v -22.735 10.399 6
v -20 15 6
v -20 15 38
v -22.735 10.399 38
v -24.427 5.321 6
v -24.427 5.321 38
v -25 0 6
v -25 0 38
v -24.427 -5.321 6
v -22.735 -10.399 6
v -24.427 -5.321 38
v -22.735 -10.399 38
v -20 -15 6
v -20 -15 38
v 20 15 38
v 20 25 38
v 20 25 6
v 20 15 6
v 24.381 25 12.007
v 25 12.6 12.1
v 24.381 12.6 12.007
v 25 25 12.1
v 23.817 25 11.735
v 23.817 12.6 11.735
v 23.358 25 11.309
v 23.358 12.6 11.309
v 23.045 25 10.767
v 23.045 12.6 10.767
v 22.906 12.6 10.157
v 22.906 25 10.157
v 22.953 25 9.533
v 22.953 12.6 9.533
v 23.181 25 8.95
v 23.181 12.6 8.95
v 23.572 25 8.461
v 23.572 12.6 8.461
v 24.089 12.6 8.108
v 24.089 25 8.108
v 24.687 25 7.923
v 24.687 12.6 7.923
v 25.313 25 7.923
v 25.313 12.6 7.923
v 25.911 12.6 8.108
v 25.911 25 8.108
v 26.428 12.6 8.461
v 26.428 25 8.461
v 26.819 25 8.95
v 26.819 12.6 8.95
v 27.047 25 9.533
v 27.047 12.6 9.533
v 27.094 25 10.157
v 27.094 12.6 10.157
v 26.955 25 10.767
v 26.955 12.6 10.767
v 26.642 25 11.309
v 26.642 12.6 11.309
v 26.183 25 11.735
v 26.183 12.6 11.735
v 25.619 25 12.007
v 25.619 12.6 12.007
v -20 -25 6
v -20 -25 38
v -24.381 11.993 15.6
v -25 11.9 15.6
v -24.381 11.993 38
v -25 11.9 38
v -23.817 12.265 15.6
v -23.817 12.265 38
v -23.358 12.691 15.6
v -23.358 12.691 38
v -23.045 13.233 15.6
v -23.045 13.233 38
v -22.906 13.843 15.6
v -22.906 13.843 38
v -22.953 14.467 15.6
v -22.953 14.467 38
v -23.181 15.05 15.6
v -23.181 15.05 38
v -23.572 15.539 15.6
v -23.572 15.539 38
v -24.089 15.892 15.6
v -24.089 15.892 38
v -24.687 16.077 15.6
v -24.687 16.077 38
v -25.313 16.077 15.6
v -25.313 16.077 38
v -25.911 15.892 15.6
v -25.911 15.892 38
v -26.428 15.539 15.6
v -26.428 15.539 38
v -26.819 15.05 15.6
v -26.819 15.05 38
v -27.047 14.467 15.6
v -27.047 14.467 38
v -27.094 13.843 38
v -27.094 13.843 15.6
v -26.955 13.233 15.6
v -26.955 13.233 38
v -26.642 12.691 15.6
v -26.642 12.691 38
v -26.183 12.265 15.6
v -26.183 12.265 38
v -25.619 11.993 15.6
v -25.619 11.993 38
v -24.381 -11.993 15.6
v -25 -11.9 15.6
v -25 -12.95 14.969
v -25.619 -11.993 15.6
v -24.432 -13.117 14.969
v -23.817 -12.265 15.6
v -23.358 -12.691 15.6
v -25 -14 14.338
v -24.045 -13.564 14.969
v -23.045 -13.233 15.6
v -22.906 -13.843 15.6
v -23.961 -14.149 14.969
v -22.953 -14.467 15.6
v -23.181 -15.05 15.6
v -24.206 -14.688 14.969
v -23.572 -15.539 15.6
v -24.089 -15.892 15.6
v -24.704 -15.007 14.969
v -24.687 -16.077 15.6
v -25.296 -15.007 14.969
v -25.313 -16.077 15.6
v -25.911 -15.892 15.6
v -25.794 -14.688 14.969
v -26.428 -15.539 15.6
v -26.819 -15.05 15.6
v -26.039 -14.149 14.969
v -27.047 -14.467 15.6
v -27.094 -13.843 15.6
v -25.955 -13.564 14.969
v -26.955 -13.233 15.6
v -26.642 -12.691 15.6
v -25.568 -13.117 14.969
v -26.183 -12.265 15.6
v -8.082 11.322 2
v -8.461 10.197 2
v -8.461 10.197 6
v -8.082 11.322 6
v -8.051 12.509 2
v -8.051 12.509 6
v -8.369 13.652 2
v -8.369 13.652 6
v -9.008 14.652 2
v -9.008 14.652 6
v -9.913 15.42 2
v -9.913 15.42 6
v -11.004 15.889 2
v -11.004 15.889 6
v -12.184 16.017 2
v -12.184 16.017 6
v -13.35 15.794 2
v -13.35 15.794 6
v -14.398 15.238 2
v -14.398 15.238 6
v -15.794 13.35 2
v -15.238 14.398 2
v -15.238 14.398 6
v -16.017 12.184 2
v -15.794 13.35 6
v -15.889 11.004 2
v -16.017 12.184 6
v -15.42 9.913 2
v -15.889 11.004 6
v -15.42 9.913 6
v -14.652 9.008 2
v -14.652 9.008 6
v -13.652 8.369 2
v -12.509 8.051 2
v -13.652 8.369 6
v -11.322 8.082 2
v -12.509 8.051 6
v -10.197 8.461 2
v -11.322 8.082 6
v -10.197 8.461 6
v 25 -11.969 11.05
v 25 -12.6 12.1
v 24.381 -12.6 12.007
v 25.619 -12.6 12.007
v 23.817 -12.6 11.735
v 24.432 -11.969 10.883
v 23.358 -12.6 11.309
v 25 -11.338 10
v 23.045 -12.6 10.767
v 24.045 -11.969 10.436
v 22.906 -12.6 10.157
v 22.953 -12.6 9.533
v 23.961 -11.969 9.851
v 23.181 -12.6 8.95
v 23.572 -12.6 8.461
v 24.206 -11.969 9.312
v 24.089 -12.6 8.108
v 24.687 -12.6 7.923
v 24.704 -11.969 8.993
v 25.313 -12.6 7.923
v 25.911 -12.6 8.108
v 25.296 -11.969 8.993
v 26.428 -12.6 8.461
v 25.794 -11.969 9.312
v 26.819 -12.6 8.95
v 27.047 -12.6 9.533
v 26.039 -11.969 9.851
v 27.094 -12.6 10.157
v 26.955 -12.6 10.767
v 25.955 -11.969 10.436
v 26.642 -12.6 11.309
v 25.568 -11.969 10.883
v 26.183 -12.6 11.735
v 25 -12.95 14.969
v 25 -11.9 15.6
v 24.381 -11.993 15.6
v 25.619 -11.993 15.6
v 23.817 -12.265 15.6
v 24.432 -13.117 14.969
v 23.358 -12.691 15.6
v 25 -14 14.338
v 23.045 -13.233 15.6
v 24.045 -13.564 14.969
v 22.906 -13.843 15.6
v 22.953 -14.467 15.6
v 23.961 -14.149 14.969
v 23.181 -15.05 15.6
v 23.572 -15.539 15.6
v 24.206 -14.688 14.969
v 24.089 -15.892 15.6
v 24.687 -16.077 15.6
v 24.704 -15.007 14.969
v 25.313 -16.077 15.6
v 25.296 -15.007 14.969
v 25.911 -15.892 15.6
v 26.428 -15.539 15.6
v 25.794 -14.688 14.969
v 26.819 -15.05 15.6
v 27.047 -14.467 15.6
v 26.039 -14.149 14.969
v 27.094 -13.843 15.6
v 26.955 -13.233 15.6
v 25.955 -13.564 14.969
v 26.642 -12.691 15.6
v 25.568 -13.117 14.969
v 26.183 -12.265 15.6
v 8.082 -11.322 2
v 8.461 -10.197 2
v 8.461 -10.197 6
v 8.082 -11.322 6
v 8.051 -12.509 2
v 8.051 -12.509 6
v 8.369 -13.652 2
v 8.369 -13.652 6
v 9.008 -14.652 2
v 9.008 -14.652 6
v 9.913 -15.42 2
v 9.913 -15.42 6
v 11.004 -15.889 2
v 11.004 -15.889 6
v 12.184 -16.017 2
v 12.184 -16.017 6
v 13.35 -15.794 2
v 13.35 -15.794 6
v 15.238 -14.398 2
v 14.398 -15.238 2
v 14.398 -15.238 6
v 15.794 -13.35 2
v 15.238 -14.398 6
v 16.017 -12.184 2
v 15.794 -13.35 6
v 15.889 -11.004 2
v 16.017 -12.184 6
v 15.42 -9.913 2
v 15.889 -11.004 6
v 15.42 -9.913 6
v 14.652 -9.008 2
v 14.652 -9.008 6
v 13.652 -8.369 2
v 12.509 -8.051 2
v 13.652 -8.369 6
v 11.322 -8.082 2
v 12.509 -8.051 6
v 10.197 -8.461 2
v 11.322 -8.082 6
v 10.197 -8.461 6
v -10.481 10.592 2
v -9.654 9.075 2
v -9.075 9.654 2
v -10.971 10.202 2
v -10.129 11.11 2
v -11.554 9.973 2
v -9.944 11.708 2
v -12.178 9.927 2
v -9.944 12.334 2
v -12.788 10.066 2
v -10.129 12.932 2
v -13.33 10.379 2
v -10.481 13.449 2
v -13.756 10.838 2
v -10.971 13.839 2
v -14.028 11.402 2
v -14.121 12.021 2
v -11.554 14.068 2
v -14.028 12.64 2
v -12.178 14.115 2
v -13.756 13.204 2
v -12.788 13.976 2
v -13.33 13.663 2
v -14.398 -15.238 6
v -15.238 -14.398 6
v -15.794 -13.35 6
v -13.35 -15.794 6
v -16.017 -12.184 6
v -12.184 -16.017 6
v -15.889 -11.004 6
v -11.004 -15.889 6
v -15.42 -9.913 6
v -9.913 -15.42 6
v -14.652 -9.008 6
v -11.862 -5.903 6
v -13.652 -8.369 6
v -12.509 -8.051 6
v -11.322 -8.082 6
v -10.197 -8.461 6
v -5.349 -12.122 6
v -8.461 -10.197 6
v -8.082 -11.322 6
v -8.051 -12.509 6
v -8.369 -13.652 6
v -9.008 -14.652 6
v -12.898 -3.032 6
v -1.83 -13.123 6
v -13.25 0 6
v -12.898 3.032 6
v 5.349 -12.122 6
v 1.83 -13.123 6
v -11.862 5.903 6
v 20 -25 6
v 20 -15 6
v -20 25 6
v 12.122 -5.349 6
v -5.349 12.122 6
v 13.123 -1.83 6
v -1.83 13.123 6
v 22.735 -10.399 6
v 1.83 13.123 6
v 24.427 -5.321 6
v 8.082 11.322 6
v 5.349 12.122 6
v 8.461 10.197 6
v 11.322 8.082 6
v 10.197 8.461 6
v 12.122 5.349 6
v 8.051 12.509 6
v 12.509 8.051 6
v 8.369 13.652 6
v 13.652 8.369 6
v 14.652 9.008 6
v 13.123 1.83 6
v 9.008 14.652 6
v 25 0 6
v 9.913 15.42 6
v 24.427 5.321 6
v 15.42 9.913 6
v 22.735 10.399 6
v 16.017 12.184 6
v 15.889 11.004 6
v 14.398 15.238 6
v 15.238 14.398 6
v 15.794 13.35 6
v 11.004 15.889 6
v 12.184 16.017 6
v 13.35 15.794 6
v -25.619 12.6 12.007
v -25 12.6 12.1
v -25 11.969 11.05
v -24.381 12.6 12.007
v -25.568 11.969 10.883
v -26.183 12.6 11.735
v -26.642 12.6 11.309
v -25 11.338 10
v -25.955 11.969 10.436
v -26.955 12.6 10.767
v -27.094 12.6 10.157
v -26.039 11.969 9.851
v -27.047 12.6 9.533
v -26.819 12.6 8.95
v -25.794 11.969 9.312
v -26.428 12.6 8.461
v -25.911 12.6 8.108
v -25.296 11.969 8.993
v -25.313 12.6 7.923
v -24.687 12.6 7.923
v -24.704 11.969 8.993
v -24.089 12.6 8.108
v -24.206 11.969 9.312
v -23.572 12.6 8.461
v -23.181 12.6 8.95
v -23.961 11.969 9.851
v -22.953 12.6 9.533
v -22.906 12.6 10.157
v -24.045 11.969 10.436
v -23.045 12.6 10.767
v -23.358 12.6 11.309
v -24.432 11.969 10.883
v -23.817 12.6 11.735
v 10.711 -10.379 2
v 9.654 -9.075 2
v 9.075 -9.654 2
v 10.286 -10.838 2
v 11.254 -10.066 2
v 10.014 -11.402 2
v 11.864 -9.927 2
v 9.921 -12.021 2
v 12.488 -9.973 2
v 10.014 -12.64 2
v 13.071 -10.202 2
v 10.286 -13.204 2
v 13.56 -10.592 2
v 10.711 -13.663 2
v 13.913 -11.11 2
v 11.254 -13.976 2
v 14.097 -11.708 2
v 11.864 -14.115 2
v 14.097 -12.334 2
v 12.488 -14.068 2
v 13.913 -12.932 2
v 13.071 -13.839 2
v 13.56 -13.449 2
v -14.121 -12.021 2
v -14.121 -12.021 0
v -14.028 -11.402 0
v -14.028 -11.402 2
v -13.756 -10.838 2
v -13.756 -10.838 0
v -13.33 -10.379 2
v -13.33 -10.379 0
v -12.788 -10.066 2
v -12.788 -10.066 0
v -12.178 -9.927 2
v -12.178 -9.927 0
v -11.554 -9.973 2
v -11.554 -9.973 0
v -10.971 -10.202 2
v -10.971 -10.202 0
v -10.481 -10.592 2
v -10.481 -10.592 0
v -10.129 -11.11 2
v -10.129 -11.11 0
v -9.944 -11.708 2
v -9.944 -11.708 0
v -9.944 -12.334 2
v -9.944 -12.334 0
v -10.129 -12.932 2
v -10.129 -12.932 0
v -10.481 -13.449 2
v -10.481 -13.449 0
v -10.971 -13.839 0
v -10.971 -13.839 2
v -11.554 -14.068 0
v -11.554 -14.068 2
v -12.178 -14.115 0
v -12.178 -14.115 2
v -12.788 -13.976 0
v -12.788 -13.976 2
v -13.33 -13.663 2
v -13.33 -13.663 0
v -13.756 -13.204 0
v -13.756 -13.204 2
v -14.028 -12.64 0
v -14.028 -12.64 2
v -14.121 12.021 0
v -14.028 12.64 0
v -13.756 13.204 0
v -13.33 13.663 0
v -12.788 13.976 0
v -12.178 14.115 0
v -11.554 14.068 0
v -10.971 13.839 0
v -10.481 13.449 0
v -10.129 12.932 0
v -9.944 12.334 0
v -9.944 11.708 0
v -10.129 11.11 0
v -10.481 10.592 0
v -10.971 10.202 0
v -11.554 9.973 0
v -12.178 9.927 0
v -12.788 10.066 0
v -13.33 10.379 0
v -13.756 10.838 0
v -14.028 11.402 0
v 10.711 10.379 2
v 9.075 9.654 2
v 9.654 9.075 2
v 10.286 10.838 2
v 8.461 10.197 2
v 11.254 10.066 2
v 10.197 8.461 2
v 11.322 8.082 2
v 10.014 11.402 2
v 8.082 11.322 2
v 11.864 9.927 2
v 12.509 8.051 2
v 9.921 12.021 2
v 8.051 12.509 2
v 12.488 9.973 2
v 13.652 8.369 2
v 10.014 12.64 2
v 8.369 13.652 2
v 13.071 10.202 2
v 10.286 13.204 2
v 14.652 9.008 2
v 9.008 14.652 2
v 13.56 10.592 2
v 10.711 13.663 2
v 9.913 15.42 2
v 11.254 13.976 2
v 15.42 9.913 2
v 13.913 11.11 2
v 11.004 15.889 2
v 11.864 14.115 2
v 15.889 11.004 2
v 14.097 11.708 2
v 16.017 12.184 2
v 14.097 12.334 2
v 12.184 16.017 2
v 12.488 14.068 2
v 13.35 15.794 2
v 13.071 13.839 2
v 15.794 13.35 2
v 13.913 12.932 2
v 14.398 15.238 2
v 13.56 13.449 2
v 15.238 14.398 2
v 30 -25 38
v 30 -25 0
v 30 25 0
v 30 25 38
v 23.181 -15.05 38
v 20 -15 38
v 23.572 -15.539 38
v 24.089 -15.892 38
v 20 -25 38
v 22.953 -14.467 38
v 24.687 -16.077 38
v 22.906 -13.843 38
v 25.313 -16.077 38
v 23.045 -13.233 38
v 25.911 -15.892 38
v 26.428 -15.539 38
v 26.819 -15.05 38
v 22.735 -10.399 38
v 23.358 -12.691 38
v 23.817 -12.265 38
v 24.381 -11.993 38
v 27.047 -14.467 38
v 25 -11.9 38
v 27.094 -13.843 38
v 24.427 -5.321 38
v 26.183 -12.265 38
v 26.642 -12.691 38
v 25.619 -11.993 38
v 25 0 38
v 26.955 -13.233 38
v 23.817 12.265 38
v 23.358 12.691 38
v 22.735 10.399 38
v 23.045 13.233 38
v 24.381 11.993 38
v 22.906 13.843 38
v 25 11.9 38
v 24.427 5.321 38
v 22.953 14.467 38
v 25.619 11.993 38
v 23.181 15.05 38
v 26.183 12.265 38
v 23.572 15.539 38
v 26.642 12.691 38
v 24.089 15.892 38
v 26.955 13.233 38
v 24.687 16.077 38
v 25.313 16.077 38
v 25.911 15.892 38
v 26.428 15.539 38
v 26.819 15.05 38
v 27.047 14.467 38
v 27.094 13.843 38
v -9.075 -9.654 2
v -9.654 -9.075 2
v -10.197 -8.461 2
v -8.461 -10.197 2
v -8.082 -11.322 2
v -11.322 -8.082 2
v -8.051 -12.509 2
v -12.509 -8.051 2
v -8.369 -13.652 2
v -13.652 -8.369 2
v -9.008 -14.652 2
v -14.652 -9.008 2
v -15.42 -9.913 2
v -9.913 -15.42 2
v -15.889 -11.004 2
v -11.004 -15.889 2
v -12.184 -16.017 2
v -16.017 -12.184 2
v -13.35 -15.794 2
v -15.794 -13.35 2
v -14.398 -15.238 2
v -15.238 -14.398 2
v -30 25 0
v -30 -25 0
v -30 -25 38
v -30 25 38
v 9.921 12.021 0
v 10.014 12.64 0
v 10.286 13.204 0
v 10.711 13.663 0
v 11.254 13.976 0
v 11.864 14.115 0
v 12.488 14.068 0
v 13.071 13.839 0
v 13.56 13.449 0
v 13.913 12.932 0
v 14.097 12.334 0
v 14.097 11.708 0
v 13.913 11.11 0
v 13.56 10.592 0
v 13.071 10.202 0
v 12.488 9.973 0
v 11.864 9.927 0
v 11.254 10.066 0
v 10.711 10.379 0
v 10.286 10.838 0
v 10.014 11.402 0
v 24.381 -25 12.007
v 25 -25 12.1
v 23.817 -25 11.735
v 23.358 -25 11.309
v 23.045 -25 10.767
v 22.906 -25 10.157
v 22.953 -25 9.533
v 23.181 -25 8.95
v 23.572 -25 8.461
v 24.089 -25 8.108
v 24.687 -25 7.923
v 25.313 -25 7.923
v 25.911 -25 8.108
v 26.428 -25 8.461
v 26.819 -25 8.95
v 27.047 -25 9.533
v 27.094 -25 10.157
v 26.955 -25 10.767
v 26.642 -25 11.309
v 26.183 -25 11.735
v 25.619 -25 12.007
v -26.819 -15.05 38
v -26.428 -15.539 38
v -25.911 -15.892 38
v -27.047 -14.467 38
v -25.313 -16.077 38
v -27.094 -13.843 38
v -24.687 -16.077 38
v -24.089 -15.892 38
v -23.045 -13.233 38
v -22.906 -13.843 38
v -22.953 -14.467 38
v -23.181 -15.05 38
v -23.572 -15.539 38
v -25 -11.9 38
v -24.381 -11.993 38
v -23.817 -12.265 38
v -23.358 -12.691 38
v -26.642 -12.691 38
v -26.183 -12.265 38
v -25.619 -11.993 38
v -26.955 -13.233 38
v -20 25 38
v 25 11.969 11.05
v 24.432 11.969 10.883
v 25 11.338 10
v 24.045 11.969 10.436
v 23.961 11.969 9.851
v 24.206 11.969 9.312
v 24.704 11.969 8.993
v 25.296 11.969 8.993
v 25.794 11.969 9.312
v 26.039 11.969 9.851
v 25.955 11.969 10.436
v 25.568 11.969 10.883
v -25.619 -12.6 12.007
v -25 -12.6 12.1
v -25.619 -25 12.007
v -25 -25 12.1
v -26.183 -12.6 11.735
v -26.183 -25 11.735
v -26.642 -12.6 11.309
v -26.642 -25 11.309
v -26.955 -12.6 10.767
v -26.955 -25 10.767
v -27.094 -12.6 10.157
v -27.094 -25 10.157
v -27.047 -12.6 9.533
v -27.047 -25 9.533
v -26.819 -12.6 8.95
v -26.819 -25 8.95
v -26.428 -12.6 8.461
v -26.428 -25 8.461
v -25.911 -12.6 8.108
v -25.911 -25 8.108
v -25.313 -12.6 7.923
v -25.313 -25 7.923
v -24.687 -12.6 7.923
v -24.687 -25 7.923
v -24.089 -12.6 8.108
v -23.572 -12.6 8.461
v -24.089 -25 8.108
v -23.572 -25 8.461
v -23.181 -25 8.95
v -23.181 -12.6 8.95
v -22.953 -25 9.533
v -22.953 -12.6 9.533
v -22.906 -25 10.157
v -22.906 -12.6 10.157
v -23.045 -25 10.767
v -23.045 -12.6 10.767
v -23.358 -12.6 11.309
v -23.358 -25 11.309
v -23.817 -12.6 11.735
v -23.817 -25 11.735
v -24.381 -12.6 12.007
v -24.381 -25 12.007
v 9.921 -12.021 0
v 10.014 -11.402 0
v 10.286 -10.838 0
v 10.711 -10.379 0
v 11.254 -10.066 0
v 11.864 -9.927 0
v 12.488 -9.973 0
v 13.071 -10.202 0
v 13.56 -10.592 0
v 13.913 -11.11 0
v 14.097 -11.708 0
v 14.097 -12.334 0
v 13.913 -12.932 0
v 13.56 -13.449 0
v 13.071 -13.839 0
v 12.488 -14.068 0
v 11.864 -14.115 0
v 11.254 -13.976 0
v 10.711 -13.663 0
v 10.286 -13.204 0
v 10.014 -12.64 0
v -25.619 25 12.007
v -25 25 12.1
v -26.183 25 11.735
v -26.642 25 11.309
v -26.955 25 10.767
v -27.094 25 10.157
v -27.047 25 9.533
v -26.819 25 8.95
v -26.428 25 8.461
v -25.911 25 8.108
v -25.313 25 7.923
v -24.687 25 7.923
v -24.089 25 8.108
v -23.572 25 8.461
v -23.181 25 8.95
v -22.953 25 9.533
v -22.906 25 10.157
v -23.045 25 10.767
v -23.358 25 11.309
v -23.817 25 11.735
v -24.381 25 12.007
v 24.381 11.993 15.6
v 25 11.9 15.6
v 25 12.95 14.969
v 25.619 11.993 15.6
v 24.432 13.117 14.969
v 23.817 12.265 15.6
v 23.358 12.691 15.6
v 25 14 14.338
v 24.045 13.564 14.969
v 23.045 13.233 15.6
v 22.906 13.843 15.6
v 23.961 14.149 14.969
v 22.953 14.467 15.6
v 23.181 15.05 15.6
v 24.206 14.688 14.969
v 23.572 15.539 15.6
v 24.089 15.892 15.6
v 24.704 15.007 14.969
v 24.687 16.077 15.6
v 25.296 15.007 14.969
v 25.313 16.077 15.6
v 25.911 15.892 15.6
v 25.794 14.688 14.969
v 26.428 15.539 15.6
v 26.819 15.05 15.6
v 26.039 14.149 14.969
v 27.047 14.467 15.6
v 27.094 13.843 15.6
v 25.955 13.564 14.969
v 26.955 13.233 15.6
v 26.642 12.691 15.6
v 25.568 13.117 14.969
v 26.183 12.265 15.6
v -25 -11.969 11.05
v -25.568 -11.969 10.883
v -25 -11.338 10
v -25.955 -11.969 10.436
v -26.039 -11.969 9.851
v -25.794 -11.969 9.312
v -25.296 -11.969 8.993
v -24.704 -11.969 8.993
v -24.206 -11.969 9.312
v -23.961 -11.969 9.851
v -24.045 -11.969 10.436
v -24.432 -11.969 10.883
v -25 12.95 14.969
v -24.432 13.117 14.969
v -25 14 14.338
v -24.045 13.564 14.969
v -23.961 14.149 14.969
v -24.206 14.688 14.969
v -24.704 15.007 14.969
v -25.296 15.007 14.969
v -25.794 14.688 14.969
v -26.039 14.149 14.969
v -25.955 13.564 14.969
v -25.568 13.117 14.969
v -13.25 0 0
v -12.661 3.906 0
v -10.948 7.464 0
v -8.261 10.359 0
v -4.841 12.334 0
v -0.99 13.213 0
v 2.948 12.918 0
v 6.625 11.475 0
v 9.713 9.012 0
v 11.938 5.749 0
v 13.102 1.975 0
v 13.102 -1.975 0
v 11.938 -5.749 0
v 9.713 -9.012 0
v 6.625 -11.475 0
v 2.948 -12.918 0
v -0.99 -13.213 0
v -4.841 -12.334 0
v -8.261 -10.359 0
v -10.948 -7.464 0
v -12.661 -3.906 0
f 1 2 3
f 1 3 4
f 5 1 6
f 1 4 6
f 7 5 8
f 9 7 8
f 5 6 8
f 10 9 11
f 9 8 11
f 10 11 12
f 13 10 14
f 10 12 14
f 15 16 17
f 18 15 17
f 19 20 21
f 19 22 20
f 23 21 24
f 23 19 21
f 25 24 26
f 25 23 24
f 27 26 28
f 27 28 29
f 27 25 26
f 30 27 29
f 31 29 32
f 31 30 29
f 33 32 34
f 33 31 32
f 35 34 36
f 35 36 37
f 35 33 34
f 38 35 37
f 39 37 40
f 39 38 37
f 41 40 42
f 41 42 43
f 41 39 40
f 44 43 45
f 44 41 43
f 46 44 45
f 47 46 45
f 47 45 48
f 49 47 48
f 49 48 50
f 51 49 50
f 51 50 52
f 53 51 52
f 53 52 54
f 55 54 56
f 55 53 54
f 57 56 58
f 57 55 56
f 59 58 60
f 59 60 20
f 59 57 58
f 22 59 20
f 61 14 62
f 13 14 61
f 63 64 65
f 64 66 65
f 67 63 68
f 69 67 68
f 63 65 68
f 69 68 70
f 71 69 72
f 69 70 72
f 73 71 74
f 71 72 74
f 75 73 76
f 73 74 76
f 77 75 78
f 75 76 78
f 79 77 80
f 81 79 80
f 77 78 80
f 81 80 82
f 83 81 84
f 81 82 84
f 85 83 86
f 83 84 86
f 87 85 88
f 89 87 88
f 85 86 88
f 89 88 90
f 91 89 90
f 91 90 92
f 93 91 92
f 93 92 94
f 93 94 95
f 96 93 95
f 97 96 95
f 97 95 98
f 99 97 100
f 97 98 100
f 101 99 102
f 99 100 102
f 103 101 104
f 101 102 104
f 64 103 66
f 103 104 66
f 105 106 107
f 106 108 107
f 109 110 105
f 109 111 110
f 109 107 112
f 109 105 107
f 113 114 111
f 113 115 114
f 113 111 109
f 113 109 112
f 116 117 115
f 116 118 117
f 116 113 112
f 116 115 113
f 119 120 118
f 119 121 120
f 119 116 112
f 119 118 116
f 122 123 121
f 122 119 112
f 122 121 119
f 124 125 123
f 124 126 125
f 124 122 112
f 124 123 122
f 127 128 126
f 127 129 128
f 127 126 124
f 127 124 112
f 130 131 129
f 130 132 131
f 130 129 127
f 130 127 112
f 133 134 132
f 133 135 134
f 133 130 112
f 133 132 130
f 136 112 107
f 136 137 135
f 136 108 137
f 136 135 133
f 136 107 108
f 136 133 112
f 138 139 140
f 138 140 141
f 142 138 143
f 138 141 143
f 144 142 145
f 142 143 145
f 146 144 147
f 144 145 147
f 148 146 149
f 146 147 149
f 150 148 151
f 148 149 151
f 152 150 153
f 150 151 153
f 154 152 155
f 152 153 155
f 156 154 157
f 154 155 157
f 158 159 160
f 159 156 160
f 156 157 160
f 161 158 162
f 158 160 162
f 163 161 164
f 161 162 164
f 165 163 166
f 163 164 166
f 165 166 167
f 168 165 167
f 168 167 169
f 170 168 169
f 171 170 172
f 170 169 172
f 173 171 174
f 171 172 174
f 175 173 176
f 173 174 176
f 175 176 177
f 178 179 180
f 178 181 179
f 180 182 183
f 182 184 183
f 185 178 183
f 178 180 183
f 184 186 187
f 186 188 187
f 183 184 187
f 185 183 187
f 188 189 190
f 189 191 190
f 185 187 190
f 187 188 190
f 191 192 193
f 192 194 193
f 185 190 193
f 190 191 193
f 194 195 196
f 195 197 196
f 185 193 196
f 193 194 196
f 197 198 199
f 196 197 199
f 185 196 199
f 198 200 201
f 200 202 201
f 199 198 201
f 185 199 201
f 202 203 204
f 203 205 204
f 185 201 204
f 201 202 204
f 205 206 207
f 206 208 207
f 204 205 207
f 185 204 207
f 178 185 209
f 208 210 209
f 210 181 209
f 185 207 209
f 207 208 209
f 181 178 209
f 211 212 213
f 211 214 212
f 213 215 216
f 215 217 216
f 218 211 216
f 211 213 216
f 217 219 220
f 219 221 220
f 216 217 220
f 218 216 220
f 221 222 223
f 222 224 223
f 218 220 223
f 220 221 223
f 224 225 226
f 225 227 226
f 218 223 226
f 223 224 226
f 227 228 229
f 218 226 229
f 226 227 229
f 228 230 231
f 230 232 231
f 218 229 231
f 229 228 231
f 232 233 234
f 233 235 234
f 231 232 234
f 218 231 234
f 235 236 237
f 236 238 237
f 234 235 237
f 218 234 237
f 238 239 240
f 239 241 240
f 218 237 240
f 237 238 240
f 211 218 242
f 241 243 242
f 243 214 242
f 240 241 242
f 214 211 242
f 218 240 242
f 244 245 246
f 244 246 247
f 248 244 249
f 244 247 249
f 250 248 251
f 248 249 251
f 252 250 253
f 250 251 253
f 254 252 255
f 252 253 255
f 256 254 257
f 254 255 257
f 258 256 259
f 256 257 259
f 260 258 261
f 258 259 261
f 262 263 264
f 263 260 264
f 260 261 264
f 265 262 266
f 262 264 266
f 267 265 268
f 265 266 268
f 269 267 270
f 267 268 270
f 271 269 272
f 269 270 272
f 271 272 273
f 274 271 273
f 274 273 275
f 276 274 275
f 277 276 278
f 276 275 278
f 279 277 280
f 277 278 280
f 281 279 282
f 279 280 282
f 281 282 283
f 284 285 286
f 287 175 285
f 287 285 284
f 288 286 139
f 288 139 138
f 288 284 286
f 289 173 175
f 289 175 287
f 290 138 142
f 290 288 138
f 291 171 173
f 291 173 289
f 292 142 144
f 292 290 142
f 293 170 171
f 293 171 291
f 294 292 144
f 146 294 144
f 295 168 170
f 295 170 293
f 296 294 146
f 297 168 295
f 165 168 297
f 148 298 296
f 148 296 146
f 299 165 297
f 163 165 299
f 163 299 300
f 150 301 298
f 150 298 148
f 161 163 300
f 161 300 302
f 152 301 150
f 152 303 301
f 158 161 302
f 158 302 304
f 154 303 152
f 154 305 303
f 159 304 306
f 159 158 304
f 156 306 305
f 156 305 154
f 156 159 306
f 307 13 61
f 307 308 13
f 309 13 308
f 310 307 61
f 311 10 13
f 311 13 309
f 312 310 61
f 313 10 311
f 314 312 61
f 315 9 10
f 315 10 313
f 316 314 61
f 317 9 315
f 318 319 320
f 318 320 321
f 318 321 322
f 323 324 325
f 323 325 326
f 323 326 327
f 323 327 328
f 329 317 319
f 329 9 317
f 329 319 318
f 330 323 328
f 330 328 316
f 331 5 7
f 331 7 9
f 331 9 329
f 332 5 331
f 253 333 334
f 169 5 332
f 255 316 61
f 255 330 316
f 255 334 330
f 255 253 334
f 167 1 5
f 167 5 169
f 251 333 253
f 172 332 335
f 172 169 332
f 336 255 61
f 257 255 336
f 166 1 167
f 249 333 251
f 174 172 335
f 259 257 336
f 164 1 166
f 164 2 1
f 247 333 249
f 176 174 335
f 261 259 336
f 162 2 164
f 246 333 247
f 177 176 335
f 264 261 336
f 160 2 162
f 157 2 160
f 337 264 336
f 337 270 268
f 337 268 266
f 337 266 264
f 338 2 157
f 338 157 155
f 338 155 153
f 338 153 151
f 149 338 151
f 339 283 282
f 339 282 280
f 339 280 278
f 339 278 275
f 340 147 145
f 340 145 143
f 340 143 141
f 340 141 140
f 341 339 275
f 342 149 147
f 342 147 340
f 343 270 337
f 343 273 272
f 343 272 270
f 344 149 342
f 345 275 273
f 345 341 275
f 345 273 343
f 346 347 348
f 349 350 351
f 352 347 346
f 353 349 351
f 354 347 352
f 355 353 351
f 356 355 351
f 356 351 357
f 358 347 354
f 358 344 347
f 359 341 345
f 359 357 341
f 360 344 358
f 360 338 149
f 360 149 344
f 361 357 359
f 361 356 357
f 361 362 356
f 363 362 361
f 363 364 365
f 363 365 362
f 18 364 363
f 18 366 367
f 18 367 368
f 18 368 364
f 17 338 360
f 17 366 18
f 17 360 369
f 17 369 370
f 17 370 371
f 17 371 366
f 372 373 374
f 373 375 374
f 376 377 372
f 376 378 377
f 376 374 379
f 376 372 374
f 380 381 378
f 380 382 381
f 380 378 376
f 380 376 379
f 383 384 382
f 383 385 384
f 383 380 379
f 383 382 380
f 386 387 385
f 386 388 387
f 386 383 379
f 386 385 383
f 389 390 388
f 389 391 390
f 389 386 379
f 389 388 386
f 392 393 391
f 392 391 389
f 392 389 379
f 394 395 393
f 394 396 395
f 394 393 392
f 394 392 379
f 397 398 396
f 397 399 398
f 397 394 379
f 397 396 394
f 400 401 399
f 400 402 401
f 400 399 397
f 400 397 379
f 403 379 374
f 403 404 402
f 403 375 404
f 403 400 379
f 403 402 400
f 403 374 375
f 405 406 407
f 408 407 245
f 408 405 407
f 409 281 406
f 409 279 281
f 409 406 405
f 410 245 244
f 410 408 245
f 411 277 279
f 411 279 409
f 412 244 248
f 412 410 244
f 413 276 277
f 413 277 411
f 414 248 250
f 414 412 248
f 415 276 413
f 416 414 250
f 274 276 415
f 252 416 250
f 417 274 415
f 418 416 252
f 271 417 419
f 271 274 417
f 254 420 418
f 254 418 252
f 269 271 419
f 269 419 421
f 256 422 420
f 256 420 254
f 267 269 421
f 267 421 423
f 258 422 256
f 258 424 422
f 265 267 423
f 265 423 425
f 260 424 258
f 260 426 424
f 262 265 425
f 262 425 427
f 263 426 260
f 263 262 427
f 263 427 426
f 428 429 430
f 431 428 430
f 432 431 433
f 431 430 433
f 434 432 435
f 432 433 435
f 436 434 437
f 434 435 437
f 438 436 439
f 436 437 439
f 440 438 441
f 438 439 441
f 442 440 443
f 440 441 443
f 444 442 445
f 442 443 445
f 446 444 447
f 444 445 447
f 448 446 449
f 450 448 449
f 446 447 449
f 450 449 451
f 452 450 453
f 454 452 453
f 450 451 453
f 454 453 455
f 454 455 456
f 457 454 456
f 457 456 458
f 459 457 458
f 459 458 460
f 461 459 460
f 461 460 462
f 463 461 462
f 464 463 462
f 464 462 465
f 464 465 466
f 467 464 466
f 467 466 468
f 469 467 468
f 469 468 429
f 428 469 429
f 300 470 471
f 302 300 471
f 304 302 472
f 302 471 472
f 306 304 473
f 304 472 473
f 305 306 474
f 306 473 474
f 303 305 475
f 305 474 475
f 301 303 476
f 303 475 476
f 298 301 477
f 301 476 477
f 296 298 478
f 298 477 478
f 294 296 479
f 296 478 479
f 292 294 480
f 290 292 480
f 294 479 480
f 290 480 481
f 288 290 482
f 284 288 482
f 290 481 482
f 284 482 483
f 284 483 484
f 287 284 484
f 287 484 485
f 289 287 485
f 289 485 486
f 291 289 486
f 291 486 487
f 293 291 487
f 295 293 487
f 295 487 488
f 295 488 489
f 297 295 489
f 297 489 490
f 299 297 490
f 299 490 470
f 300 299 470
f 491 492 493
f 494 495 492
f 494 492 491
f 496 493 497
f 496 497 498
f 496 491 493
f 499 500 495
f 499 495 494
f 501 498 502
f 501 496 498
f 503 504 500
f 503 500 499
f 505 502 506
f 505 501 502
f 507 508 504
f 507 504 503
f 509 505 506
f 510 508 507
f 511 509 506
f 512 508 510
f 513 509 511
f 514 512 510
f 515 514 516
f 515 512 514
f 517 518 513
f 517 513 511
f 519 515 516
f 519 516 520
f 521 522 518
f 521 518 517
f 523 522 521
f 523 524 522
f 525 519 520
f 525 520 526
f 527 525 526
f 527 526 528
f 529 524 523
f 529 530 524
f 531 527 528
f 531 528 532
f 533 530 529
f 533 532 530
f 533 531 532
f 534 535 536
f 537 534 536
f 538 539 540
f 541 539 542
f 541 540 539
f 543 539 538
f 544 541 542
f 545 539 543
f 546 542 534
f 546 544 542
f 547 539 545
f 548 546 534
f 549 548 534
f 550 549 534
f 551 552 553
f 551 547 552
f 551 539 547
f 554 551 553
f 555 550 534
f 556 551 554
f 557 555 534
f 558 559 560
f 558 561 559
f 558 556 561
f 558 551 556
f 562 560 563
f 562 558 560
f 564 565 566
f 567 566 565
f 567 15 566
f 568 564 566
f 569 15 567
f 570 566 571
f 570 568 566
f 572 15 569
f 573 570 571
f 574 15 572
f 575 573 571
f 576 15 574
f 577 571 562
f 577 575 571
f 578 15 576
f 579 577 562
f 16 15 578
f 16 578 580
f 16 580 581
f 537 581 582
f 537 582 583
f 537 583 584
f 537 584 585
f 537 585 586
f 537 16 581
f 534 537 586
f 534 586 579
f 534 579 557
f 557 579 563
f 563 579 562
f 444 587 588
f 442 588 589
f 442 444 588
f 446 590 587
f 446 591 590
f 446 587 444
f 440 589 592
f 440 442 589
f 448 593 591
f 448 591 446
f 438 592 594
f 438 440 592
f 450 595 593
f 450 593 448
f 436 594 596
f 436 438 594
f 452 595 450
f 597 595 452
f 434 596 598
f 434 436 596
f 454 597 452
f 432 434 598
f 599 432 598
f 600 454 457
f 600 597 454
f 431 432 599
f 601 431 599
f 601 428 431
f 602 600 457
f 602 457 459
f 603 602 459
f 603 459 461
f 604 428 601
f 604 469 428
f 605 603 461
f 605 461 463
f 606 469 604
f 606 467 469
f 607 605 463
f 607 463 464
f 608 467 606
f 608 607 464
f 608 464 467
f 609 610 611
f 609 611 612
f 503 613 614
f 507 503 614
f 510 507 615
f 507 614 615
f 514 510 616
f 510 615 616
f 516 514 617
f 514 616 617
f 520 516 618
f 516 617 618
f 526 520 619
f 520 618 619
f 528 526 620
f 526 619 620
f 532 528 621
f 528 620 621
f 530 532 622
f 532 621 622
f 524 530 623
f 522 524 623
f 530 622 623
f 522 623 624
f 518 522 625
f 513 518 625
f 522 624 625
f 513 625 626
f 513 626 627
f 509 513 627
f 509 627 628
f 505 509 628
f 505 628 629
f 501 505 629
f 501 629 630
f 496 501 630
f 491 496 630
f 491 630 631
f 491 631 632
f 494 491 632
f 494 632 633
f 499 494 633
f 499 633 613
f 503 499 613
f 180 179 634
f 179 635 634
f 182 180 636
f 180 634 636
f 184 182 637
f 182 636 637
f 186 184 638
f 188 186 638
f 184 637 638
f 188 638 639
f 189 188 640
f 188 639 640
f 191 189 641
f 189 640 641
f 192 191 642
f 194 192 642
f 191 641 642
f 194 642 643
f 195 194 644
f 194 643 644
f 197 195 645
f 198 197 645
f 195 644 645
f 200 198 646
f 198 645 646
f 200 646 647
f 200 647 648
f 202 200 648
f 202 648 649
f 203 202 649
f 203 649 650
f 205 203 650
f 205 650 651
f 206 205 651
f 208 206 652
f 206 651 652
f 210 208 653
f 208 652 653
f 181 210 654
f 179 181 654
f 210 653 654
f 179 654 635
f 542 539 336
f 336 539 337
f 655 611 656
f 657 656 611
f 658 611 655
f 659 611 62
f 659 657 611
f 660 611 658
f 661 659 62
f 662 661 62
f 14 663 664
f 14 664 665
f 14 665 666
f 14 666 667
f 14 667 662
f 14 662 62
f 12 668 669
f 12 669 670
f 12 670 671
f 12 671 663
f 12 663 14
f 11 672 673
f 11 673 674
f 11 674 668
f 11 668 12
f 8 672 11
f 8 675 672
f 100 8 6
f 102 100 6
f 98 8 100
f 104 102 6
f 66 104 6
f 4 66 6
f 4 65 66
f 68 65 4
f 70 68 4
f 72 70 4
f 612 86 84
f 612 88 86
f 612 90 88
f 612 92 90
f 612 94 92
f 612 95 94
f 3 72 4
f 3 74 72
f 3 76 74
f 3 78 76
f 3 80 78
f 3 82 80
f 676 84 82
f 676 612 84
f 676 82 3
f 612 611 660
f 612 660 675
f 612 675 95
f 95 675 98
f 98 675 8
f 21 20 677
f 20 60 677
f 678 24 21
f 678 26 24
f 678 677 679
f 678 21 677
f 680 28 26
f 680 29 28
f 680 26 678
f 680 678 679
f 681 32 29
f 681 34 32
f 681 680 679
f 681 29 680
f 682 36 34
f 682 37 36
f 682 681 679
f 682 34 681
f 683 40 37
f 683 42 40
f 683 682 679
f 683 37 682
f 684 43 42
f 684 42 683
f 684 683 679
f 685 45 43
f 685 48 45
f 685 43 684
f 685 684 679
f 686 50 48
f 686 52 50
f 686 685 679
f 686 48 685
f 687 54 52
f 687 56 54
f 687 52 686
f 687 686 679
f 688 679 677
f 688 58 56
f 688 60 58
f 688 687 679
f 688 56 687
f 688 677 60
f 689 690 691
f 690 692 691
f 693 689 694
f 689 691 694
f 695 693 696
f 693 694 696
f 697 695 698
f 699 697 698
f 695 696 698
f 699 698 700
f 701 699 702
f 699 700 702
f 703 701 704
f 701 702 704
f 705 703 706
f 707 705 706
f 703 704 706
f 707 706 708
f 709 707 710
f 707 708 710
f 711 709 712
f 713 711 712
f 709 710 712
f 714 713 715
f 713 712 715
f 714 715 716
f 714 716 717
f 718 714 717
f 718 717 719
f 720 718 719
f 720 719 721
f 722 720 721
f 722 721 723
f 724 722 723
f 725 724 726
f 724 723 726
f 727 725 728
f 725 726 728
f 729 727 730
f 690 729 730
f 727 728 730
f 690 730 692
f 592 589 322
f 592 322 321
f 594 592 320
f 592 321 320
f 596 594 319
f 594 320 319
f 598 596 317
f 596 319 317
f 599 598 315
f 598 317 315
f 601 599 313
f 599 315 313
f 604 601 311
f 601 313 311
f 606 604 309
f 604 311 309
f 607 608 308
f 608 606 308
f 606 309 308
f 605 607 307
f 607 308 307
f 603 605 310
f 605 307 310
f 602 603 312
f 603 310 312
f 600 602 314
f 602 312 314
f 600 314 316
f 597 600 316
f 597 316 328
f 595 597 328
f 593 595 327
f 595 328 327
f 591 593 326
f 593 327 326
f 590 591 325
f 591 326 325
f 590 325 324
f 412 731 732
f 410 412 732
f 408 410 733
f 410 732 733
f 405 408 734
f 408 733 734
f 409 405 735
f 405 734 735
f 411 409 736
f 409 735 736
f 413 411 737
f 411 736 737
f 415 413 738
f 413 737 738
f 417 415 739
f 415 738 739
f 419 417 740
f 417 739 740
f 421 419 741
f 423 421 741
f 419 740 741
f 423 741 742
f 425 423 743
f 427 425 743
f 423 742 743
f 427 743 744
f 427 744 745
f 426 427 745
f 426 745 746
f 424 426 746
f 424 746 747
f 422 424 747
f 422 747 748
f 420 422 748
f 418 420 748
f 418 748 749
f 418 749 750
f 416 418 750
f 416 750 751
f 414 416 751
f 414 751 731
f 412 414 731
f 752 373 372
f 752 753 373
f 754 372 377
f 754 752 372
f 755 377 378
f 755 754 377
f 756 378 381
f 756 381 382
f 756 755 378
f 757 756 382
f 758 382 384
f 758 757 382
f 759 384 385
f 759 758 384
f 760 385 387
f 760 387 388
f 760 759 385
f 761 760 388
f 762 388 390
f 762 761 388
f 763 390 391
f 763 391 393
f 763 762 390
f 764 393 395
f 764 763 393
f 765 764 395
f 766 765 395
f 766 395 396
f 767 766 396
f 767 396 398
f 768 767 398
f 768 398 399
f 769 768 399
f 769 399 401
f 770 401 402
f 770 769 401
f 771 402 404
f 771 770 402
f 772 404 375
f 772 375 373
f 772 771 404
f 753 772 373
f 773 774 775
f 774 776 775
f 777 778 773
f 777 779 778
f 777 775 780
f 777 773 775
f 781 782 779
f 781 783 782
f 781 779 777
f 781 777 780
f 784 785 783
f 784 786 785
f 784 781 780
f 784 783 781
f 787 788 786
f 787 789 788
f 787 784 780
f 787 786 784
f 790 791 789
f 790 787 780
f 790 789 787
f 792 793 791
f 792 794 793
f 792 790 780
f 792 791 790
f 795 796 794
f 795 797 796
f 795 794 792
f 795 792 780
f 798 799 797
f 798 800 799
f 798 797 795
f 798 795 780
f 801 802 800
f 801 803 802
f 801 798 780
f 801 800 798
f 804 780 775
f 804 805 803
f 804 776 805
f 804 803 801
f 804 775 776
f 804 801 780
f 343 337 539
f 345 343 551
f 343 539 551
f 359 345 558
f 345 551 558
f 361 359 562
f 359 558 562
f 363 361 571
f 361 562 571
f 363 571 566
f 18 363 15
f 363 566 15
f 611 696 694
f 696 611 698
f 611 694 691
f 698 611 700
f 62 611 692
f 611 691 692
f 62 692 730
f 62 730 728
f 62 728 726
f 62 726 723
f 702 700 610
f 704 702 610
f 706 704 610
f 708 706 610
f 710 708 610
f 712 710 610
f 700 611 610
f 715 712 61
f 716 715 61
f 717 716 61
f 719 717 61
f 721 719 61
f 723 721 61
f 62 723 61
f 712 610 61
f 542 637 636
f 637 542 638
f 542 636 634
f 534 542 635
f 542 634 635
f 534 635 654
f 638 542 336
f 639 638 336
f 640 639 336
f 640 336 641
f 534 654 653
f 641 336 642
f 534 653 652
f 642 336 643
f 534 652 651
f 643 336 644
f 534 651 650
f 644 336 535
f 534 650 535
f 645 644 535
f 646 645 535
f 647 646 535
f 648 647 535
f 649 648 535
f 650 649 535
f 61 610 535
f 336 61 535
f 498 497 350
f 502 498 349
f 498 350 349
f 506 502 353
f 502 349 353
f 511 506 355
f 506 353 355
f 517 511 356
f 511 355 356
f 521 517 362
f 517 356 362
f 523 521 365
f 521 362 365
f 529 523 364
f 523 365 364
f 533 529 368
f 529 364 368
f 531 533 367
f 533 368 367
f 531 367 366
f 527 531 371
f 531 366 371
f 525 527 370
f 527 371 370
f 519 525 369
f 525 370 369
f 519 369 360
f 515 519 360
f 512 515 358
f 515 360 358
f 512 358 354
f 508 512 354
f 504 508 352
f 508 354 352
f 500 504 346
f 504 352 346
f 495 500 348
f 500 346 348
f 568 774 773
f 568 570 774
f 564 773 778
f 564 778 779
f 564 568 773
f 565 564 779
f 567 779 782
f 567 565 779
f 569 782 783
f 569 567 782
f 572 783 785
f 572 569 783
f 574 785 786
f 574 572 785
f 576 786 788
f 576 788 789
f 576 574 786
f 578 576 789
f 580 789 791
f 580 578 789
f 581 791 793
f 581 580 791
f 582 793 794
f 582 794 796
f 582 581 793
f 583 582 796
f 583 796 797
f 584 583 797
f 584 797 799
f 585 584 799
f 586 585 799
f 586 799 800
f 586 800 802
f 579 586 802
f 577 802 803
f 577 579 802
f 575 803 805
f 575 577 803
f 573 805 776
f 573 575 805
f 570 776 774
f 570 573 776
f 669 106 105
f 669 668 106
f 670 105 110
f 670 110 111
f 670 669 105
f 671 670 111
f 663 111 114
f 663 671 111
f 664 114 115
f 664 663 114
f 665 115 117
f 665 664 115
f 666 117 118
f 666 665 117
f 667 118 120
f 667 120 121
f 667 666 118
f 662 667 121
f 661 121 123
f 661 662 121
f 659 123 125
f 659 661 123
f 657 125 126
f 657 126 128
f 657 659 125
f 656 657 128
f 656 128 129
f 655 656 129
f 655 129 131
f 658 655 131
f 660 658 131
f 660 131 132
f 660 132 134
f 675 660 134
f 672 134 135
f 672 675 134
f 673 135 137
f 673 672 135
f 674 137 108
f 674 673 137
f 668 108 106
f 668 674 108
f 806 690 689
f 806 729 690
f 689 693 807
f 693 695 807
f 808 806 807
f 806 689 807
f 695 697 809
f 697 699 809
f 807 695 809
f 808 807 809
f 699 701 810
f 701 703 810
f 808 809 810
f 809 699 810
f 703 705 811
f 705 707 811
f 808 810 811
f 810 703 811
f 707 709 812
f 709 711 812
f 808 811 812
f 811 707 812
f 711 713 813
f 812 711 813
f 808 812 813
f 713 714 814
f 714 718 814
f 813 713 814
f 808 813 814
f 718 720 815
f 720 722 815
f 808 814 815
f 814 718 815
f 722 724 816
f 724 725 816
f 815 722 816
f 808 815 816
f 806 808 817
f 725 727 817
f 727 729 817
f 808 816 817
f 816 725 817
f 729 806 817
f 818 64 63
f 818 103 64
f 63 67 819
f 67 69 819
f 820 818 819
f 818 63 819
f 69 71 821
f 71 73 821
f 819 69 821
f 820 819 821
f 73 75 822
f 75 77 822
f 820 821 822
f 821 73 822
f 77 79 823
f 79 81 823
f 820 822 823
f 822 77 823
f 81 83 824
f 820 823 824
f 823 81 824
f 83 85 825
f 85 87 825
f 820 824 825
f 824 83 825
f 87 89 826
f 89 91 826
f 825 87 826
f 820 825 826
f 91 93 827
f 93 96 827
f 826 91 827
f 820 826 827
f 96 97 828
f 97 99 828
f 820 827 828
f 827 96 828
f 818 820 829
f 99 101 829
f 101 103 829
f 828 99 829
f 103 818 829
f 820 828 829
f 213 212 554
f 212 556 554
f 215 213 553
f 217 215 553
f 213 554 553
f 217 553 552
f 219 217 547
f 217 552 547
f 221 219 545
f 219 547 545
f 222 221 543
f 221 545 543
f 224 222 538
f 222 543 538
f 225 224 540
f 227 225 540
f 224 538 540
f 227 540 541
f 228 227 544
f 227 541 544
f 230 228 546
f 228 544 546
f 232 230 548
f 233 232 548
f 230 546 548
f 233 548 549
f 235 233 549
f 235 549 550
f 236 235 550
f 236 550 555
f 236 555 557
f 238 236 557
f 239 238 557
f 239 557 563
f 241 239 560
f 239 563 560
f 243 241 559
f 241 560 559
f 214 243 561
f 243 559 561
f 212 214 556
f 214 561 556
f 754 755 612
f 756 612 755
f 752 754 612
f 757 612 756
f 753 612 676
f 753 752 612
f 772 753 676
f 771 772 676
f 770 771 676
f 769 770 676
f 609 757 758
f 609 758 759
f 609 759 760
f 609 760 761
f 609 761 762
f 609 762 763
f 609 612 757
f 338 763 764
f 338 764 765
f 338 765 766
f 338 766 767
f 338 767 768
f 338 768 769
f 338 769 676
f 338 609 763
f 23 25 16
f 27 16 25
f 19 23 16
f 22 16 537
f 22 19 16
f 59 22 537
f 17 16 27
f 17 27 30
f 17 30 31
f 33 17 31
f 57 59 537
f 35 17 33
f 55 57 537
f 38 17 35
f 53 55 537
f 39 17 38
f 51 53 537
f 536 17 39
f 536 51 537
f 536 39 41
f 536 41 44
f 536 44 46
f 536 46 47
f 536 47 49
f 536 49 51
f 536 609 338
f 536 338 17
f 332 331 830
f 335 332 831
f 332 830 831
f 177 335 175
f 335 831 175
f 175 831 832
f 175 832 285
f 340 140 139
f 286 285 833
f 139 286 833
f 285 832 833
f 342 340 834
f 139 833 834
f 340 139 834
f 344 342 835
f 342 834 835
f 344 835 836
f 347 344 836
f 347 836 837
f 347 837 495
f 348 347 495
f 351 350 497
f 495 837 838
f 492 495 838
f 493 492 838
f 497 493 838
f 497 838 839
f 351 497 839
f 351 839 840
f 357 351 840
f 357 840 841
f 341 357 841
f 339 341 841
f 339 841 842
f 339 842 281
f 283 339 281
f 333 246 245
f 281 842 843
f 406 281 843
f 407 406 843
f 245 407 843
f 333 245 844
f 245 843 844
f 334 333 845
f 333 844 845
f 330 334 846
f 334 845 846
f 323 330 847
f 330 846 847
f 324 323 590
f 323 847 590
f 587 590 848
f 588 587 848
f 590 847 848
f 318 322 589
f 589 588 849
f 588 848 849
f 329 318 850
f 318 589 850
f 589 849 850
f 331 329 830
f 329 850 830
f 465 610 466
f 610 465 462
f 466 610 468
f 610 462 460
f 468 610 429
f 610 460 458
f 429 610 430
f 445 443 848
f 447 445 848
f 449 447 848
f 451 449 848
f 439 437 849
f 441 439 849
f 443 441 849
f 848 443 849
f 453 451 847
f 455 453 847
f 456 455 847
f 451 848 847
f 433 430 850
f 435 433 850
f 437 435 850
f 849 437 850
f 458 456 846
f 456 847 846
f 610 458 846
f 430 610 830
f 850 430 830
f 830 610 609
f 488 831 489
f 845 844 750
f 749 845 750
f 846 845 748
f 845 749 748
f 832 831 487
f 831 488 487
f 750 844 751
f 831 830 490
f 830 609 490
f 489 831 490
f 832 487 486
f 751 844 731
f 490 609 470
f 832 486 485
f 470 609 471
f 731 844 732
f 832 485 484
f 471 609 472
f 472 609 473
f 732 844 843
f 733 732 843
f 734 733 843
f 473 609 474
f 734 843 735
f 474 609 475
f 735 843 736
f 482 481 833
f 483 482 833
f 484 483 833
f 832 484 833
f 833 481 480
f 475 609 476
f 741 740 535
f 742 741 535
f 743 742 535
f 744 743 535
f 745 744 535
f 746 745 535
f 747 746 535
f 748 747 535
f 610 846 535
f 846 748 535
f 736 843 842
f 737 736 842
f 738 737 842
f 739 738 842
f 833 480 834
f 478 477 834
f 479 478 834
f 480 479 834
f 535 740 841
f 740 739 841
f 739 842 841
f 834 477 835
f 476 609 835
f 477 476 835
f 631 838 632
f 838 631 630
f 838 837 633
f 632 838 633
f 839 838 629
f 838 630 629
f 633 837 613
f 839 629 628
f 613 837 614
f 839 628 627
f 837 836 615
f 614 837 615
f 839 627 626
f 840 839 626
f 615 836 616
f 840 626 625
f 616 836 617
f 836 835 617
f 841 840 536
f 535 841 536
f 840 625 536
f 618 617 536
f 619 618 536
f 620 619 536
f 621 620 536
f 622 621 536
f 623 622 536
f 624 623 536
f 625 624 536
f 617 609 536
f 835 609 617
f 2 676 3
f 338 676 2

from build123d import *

# Parameters (mm, degrees)
SKETCH_1_W                  = 60
SKETCH_1_H                  = 50
EXTRUDE_1_DEPTH             = 38
SKETCH_2_W                  = 40
SKETCH_2_H                  = 67.456297037
CUT_EXTRUDE_1_DEPTH         = 70.598850565
SKETCH_3_R                  = 25
CUT_EXTRUDE_2_DEPTH         = 32
SKETCH_4_R                  = 13.25
CUT_EXTRUDE_3_DEPTH         = 10
HOLE_WIZARD_4_2_4_2_1_D     = 4.2
HOLE_WIZARD_M5_2_AT_2_COUNT = 2
HOLE_WIZARD_M5_2_AT_2_PITCH = 50
SKETCH_11_R                 = 4
CUT_EXTRUDE_4_DEPTH         = 4
PATTERN_CIRCULAR_1_COUNT    = 4


with BuildPart() as part:
    # 草图1 → 凸台-拉伸1 (new body)
    with BuildSketch(Plane.XY):
        Rectangle(SKETCH_1_W, SKETCH_1_H)
    extrude(amount=EXTRUDE_1_DEPTH)

    # 草图2 → 切除-拉伸1 (cut, through all)
    with BuildSketch(Plane(origin=(0, 25, 0), x_dir=(1, 0, 0), z_dir=(0, 1, 0))):
        with Locations((0, -39.728148518)):
            Rectangle(SKETCH_2_W, SKETCH_2_H)
    extrude(amount=-CUT_EXTRUDE_1_DEPTH, mode=Mode.SUBTRACT)

    # 草图3 → 切除-拉伸2 (cut)
    with BuildSketch(Plane.XY.offset(38)):
        Circle(SKETCH_3_R)
    extrude(amount=-CUT_EXTRUDE_2_DEPTH, mode=Mode.SUBTRACT)

    # 草图4 → 切除-拉伸3 (cut)
    with BuildSketch(Plane(origin=(0, 0, 0), x_dir=(-1, 0, 0), z_dir=(0, 0, -1))):
        Circle(SKETCH_4_R)
    extrude(amount=-CUT_EXTRUDE_3_DEPTH, mode=Mode.SUBTRACT)

    # Ø4.2 (4.2) 直径孔1 (through all)
    with Locations(Plane.XY.offset(6)):
        with Locations((12.02081528, 12.02081528), (-12.02081528, 12.02081528), (-12.02081528, -12.02081528), (12.02081528, -12.02081528)):
            Hole(HOLE_WIZARD_4_2_4_2_1_D / 2)

    # 草图7 → M5 螺纹孔1 (revolve, cut)
    with BuildSketch(Plane(origin=(25, 14, 38), x_dir=(0, -1, 0), z_dir=(1, 0, 0))):
        Polygon((0, 0), (0, 23.6618073), (2.1, 22.4), (2.1, 0), align=None)
    hole_wizard_m5_1 = revolve(axis=Axis((25, 14, 44.35), (0, 0, -1)), mode=Mode.SUBTRACT)

    # 镜向1: M5 螺纹孔1 across plane
    add(hole_wizard_m5_1.mirror(Plane.ZX), mode=Mode.SUBTRACT)

    # 镜向2: M5 螺纹孔1 across plane
    add(hole_wizard_m5_1.mirror(Plane.ZY), mode=Mode.SUBTRACT)

    # 镜向2 copy 1 sketch → 镜向2 copy 1 (revolve, cut)
    with BuildSketch(Plane(origin=(-25, -14, 38), x_dir=(0, 1, 0), z_dir=(-1, 0, 0))):
        Polygon((0, 0), (0, 23.6618073), (2.1, 22.4), (2.1, 0), align=None)
    revolve(axis=Axis((-25, -14, 44.35), (0, 0, -1)), mode=Mode.SUBTRACT)

    # 草图9 → M5 螺纹孔2 (revolve, cut)
    with BuildSketch(Plane(origin=(-25, 25, 10), x_dir=(0, 0, 1), z_dir=(1, 0, 0))):
        Polygon((0, 0), (0, 13.6618073), (2.1, 12.4), (2.1, 0), align=None)
    hole_wizard_m5_2 = revolve(axis=Axis((-25, 31.35, 10), (0, -1, 0)), mode=Mode.SUBTRACT)

    # M5 螺纹孔2 at 2: M5 螺纹孔2 ×2
    with Locations(*[(i * HOLE_WIZARD_M5_2_AT_2_PITCH, 0, 0) for i in range(1, HOLE_WIZARD_M5_2_AT_2_COUNT)]):
        add(hole_wizard_m5_2, mode=Mode.SUBTRACT)

    # 镜向3: M5 螺纹孔2 across plane
    add(hole_wizard_m5_2.mirror(Plane.ZX), mode=Mode.SUBTRACT)

    # 镜向3 copy 1 sketch → 镜向3 copy 1 (revolve, cut)
    with BuildSketch(Plane(origin=(25, -25, 10), x_dir=(0, 0, 1), z_dir=(1, 0, 0))):
        Polygon((0, 0), (0, -13.6618073), (2.1, -12.4), (2.1, 0), align=None)
    revolve(axis=Axis((25, -31.35, 10), (0, -1, 0)), mode=Mode.SUBTRACT)

    # 草图11 → 切除-拉伸4 (cut)
    with BuildSketch(Plane.XY.offset(6)):
        with Locations((12.02081528, 12.02081528)):
            Circle(SKETCH_11_R)
    cut_extrude_4 = extrude(amount=-CUT_EXTRUDE_4_DEPTH, mode=Mode.SUBTRACT)

    # 阵列(圆周)1: 切除-拉伸4 ×4 about axis
    pattern_circular_1_axis = Axis((0, 0, 0), (0, 0, 1))
    for i in range(1, PATTERN_CIRCULAR_1_COUNT):
        add(cut_extrude_4.rotate(pattern_circular_1_axis, i * 360 / PATTERN_CIRCULAR_1_COUNT), mode=Mode.SUBTRACT)


solid = part.part
